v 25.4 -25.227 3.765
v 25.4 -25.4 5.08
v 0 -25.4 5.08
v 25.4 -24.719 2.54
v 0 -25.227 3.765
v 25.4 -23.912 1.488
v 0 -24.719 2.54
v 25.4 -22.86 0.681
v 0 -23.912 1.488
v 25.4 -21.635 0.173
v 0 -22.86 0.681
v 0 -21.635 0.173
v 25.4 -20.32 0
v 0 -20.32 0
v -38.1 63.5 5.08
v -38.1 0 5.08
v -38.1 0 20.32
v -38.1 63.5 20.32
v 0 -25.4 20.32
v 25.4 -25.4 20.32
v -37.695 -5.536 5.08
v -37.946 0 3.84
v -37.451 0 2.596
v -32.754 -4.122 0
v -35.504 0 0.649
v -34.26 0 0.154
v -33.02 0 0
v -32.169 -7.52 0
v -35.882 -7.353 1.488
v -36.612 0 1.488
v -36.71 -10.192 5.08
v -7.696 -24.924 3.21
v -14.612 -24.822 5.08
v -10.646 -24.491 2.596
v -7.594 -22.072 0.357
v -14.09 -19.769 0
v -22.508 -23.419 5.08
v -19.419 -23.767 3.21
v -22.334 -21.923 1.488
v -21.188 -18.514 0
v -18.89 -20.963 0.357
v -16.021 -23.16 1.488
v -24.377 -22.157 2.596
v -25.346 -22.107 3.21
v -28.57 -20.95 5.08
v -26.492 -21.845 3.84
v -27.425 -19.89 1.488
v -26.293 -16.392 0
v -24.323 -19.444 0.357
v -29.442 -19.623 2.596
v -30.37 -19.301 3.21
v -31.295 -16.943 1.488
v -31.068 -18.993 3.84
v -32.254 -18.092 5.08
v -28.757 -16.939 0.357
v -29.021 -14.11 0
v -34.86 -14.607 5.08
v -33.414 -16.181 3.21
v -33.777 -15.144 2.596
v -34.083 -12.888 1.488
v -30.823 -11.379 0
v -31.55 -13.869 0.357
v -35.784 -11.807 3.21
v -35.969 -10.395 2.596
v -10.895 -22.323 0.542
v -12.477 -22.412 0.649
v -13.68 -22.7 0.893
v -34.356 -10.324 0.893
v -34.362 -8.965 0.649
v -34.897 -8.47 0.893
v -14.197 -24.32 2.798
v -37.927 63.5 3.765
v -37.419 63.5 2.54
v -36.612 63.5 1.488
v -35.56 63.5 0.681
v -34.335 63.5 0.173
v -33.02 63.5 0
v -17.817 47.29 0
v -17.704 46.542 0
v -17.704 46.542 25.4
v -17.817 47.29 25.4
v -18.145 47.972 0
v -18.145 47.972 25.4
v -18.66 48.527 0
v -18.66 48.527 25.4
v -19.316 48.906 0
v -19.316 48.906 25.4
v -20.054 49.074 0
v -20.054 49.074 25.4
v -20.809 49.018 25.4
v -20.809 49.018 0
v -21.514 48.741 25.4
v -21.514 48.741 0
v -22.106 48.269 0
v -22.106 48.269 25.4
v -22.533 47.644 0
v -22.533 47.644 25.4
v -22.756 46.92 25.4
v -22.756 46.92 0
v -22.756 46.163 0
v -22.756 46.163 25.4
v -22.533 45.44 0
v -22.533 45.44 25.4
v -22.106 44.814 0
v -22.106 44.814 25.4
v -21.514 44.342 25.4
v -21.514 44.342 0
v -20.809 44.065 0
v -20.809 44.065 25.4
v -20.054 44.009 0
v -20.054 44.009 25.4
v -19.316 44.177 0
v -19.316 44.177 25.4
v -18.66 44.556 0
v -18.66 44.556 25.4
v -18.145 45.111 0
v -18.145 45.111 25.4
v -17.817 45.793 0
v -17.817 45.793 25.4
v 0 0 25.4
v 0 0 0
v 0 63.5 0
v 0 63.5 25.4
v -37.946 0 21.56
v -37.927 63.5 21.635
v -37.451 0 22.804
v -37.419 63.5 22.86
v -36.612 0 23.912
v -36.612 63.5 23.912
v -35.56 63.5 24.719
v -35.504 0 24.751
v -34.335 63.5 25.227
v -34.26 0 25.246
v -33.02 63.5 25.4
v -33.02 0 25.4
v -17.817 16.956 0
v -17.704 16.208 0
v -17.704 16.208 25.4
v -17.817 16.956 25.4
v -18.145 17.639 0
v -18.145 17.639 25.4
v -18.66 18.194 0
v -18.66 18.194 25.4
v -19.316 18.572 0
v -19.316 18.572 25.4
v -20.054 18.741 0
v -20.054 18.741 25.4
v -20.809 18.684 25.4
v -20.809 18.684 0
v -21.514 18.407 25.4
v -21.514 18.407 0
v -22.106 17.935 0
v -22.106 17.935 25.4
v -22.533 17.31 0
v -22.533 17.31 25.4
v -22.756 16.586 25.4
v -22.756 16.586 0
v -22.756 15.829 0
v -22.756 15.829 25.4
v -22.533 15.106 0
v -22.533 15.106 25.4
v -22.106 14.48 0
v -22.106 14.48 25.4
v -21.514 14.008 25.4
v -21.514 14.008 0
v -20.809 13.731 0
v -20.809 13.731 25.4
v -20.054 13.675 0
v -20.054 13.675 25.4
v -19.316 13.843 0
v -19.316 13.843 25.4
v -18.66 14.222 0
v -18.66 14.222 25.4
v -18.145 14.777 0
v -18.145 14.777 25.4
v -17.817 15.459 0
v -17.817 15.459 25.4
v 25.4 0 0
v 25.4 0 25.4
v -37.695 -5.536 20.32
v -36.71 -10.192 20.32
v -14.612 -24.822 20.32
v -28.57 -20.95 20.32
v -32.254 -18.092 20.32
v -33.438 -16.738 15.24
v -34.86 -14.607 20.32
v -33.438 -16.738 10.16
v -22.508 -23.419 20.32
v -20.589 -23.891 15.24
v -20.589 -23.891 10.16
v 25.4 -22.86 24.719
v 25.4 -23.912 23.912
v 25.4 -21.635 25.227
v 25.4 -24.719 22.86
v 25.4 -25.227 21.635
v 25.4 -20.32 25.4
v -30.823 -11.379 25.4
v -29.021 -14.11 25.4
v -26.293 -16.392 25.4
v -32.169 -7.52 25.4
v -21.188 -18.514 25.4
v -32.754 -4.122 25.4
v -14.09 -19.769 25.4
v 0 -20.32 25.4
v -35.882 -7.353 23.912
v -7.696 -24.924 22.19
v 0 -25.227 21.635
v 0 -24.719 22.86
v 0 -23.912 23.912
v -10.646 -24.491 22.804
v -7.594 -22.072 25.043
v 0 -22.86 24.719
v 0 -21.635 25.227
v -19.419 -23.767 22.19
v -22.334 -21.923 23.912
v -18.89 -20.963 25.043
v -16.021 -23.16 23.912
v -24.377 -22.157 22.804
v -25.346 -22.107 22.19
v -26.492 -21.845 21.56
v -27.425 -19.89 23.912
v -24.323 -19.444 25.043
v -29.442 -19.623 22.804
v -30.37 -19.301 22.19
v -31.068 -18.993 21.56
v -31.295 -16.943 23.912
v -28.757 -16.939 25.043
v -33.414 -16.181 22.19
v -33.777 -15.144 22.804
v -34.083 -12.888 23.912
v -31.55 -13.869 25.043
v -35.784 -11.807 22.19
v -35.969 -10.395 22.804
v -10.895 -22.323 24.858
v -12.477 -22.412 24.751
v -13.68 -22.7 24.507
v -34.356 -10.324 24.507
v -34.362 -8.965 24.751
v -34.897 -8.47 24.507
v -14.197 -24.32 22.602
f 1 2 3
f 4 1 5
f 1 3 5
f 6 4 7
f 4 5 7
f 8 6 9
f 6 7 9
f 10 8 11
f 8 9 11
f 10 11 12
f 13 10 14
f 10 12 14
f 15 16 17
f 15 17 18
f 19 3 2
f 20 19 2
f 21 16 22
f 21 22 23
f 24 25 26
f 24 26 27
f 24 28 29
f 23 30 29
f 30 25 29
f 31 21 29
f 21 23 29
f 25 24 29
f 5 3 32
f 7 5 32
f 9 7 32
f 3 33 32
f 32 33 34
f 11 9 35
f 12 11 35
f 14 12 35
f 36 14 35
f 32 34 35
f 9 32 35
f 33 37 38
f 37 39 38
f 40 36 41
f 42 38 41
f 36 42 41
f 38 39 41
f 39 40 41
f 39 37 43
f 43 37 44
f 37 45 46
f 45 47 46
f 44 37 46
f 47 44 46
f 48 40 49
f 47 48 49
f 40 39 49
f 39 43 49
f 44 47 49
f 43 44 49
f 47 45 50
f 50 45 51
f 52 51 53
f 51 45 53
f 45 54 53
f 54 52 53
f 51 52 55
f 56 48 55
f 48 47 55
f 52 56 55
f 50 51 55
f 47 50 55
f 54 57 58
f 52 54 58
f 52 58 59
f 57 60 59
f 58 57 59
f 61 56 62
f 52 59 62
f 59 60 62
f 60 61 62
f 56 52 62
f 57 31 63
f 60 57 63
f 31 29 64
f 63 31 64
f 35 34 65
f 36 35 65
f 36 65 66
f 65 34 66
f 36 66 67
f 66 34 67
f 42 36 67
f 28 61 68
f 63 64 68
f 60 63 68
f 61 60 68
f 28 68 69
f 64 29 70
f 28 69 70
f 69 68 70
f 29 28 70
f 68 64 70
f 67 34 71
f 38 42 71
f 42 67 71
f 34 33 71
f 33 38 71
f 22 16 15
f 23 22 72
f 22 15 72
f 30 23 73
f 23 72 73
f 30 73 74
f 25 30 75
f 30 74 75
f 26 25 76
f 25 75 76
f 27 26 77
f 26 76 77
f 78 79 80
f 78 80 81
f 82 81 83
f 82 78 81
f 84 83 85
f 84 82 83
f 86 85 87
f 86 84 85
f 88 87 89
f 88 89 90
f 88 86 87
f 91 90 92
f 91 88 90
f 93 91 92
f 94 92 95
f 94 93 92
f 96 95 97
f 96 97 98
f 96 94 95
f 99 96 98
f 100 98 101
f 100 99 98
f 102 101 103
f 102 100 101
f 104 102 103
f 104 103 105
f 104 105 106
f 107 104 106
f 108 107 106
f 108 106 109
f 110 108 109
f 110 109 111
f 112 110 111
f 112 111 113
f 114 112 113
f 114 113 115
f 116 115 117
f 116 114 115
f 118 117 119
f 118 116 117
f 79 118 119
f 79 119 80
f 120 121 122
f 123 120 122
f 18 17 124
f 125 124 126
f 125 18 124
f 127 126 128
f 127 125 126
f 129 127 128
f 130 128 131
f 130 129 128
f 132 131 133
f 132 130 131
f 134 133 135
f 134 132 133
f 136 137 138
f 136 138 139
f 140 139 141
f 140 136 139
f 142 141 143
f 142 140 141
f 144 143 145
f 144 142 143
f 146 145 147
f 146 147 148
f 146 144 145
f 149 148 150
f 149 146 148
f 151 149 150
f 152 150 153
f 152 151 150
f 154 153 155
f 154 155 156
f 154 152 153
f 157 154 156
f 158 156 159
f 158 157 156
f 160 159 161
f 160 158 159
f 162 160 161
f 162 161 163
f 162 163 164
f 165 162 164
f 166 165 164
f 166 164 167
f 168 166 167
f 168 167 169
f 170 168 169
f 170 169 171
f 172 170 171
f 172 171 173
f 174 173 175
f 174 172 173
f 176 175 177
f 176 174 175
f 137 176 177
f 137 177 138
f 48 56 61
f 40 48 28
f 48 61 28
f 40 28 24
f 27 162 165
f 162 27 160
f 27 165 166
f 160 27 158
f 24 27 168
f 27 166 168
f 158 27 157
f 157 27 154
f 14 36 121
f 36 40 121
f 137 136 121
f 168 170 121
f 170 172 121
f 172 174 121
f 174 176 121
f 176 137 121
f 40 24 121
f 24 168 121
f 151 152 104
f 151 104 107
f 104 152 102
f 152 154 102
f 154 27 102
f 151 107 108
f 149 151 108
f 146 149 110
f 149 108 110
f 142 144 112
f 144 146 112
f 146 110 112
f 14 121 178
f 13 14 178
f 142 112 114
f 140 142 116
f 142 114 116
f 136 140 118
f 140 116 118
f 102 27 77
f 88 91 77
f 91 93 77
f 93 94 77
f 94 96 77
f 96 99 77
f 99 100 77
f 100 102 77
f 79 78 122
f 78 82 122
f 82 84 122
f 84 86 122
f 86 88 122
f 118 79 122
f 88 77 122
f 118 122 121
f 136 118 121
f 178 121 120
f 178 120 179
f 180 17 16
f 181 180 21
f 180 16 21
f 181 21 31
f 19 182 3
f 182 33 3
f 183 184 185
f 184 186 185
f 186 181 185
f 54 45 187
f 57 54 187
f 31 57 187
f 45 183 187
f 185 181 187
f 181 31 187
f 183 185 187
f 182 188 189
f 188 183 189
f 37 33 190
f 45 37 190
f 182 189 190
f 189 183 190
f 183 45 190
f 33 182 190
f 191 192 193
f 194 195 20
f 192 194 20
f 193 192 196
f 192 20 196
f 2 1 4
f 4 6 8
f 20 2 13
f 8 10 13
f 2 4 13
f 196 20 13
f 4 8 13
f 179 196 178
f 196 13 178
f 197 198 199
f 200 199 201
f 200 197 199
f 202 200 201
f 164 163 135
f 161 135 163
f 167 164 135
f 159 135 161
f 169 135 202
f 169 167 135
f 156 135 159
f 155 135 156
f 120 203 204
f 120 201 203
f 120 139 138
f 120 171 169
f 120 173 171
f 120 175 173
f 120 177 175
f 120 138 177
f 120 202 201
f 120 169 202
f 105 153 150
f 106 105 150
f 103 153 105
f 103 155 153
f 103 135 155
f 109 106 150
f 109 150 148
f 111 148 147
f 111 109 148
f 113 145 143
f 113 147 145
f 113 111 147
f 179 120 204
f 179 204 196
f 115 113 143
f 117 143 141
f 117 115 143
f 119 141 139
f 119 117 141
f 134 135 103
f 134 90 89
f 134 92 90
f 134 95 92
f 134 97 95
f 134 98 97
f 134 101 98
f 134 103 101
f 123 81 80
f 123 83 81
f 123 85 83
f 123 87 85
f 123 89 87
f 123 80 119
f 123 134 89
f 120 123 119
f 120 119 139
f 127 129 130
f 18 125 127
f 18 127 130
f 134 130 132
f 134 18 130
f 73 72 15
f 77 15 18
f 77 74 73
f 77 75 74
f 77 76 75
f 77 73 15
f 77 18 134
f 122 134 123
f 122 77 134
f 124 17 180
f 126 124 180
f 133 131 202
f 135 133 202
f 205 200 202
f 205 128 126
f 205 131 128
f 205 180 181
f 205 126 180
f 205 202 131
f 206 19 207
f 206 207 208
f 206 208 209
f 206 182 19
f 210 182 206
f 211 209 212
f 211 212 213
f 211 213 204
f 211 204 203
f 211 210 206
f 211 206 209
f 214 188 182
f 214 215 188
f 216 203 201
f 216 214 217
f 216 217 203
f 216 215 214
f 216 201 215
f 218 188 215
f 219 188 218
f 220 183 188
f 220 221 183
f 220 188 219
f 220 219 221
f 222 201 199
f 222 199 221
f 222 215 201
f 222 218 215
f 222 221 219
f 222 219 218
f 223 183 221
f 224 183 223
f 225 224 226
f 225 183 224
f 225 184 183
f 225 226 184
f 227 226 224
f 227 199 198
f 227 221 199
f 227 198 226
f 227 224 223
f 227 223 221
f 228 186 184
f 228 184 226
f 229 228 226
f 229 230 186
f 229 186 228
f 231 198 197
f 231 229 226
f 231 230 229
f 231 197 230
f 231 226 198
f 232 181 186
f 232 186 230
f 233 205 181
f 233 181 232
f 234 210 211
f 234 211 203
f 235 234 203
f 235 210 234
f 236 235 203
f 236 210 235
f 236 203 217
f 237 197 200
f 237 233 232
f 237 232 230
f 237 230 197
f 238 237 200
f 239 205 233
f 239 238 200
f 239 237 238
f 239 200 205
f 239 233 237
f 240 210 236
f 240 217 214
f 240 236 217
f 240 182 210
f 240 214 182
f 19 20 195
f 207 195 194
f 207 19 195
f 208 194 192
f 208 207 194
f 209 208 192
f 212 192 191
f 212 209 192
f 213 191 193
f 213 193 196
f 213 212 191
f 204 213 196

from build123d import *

# Parameters (mm, degrees)
F0_W     = 38.1
F0_H     = 63.5
F0_R     = 2.54
F0_W_2   = 25.4
F0_H_2   = 25.4
F1_DEPTH = 25.4
F2_R     = 5.08


with BuildPart() as f1:
    # F0 (on Top) → F1 (new body)
    with BuildSketch(Plane.XY):
        with Locations((-19.05, 31.75)):
            Rectangle(F0_W, F0_H)
        with Locations((-20.244129, 16.207738)):
            Circle(F0_R, mode=Mode.SUBTRACT)
        with Locations((-20.244129, 46.541594)):
            Circle(F0_R, mode=Mode.SUBTRACT)
        with Locations((12.7, -12.7)):
            Rectangle(F0_W_2, F0_H_2)
        with BuildLine():
            Line((0, -25.4), (0, 0))
            Line((0, 0), (-38.1, 0))
            add(Edge.make_bspline(
                [(-38.1, 0), (-37.680859, -22.843237), (-24.310233, -25.4), (0, -25.4)],
                knots=[0, 0, 0, 0, 45.790501, 45.790501, 45.790501, 45.790501], degree=3))
        make_face()
    extrude(amount=F1_DEPTH)

    # F2
    f2_edges = [f1.edges().sort_by_distance(p)[0] for p in [
        (-38.1, 31.75, 25.4),
        (-38.1, 31.75, 0),
        (-26.310812, -22.093817, 25.4),
        (-26.310812, -22.093817, 0),
    ]]
    fillet(f2_edges, radius=F2_R)


solid = f1.part
